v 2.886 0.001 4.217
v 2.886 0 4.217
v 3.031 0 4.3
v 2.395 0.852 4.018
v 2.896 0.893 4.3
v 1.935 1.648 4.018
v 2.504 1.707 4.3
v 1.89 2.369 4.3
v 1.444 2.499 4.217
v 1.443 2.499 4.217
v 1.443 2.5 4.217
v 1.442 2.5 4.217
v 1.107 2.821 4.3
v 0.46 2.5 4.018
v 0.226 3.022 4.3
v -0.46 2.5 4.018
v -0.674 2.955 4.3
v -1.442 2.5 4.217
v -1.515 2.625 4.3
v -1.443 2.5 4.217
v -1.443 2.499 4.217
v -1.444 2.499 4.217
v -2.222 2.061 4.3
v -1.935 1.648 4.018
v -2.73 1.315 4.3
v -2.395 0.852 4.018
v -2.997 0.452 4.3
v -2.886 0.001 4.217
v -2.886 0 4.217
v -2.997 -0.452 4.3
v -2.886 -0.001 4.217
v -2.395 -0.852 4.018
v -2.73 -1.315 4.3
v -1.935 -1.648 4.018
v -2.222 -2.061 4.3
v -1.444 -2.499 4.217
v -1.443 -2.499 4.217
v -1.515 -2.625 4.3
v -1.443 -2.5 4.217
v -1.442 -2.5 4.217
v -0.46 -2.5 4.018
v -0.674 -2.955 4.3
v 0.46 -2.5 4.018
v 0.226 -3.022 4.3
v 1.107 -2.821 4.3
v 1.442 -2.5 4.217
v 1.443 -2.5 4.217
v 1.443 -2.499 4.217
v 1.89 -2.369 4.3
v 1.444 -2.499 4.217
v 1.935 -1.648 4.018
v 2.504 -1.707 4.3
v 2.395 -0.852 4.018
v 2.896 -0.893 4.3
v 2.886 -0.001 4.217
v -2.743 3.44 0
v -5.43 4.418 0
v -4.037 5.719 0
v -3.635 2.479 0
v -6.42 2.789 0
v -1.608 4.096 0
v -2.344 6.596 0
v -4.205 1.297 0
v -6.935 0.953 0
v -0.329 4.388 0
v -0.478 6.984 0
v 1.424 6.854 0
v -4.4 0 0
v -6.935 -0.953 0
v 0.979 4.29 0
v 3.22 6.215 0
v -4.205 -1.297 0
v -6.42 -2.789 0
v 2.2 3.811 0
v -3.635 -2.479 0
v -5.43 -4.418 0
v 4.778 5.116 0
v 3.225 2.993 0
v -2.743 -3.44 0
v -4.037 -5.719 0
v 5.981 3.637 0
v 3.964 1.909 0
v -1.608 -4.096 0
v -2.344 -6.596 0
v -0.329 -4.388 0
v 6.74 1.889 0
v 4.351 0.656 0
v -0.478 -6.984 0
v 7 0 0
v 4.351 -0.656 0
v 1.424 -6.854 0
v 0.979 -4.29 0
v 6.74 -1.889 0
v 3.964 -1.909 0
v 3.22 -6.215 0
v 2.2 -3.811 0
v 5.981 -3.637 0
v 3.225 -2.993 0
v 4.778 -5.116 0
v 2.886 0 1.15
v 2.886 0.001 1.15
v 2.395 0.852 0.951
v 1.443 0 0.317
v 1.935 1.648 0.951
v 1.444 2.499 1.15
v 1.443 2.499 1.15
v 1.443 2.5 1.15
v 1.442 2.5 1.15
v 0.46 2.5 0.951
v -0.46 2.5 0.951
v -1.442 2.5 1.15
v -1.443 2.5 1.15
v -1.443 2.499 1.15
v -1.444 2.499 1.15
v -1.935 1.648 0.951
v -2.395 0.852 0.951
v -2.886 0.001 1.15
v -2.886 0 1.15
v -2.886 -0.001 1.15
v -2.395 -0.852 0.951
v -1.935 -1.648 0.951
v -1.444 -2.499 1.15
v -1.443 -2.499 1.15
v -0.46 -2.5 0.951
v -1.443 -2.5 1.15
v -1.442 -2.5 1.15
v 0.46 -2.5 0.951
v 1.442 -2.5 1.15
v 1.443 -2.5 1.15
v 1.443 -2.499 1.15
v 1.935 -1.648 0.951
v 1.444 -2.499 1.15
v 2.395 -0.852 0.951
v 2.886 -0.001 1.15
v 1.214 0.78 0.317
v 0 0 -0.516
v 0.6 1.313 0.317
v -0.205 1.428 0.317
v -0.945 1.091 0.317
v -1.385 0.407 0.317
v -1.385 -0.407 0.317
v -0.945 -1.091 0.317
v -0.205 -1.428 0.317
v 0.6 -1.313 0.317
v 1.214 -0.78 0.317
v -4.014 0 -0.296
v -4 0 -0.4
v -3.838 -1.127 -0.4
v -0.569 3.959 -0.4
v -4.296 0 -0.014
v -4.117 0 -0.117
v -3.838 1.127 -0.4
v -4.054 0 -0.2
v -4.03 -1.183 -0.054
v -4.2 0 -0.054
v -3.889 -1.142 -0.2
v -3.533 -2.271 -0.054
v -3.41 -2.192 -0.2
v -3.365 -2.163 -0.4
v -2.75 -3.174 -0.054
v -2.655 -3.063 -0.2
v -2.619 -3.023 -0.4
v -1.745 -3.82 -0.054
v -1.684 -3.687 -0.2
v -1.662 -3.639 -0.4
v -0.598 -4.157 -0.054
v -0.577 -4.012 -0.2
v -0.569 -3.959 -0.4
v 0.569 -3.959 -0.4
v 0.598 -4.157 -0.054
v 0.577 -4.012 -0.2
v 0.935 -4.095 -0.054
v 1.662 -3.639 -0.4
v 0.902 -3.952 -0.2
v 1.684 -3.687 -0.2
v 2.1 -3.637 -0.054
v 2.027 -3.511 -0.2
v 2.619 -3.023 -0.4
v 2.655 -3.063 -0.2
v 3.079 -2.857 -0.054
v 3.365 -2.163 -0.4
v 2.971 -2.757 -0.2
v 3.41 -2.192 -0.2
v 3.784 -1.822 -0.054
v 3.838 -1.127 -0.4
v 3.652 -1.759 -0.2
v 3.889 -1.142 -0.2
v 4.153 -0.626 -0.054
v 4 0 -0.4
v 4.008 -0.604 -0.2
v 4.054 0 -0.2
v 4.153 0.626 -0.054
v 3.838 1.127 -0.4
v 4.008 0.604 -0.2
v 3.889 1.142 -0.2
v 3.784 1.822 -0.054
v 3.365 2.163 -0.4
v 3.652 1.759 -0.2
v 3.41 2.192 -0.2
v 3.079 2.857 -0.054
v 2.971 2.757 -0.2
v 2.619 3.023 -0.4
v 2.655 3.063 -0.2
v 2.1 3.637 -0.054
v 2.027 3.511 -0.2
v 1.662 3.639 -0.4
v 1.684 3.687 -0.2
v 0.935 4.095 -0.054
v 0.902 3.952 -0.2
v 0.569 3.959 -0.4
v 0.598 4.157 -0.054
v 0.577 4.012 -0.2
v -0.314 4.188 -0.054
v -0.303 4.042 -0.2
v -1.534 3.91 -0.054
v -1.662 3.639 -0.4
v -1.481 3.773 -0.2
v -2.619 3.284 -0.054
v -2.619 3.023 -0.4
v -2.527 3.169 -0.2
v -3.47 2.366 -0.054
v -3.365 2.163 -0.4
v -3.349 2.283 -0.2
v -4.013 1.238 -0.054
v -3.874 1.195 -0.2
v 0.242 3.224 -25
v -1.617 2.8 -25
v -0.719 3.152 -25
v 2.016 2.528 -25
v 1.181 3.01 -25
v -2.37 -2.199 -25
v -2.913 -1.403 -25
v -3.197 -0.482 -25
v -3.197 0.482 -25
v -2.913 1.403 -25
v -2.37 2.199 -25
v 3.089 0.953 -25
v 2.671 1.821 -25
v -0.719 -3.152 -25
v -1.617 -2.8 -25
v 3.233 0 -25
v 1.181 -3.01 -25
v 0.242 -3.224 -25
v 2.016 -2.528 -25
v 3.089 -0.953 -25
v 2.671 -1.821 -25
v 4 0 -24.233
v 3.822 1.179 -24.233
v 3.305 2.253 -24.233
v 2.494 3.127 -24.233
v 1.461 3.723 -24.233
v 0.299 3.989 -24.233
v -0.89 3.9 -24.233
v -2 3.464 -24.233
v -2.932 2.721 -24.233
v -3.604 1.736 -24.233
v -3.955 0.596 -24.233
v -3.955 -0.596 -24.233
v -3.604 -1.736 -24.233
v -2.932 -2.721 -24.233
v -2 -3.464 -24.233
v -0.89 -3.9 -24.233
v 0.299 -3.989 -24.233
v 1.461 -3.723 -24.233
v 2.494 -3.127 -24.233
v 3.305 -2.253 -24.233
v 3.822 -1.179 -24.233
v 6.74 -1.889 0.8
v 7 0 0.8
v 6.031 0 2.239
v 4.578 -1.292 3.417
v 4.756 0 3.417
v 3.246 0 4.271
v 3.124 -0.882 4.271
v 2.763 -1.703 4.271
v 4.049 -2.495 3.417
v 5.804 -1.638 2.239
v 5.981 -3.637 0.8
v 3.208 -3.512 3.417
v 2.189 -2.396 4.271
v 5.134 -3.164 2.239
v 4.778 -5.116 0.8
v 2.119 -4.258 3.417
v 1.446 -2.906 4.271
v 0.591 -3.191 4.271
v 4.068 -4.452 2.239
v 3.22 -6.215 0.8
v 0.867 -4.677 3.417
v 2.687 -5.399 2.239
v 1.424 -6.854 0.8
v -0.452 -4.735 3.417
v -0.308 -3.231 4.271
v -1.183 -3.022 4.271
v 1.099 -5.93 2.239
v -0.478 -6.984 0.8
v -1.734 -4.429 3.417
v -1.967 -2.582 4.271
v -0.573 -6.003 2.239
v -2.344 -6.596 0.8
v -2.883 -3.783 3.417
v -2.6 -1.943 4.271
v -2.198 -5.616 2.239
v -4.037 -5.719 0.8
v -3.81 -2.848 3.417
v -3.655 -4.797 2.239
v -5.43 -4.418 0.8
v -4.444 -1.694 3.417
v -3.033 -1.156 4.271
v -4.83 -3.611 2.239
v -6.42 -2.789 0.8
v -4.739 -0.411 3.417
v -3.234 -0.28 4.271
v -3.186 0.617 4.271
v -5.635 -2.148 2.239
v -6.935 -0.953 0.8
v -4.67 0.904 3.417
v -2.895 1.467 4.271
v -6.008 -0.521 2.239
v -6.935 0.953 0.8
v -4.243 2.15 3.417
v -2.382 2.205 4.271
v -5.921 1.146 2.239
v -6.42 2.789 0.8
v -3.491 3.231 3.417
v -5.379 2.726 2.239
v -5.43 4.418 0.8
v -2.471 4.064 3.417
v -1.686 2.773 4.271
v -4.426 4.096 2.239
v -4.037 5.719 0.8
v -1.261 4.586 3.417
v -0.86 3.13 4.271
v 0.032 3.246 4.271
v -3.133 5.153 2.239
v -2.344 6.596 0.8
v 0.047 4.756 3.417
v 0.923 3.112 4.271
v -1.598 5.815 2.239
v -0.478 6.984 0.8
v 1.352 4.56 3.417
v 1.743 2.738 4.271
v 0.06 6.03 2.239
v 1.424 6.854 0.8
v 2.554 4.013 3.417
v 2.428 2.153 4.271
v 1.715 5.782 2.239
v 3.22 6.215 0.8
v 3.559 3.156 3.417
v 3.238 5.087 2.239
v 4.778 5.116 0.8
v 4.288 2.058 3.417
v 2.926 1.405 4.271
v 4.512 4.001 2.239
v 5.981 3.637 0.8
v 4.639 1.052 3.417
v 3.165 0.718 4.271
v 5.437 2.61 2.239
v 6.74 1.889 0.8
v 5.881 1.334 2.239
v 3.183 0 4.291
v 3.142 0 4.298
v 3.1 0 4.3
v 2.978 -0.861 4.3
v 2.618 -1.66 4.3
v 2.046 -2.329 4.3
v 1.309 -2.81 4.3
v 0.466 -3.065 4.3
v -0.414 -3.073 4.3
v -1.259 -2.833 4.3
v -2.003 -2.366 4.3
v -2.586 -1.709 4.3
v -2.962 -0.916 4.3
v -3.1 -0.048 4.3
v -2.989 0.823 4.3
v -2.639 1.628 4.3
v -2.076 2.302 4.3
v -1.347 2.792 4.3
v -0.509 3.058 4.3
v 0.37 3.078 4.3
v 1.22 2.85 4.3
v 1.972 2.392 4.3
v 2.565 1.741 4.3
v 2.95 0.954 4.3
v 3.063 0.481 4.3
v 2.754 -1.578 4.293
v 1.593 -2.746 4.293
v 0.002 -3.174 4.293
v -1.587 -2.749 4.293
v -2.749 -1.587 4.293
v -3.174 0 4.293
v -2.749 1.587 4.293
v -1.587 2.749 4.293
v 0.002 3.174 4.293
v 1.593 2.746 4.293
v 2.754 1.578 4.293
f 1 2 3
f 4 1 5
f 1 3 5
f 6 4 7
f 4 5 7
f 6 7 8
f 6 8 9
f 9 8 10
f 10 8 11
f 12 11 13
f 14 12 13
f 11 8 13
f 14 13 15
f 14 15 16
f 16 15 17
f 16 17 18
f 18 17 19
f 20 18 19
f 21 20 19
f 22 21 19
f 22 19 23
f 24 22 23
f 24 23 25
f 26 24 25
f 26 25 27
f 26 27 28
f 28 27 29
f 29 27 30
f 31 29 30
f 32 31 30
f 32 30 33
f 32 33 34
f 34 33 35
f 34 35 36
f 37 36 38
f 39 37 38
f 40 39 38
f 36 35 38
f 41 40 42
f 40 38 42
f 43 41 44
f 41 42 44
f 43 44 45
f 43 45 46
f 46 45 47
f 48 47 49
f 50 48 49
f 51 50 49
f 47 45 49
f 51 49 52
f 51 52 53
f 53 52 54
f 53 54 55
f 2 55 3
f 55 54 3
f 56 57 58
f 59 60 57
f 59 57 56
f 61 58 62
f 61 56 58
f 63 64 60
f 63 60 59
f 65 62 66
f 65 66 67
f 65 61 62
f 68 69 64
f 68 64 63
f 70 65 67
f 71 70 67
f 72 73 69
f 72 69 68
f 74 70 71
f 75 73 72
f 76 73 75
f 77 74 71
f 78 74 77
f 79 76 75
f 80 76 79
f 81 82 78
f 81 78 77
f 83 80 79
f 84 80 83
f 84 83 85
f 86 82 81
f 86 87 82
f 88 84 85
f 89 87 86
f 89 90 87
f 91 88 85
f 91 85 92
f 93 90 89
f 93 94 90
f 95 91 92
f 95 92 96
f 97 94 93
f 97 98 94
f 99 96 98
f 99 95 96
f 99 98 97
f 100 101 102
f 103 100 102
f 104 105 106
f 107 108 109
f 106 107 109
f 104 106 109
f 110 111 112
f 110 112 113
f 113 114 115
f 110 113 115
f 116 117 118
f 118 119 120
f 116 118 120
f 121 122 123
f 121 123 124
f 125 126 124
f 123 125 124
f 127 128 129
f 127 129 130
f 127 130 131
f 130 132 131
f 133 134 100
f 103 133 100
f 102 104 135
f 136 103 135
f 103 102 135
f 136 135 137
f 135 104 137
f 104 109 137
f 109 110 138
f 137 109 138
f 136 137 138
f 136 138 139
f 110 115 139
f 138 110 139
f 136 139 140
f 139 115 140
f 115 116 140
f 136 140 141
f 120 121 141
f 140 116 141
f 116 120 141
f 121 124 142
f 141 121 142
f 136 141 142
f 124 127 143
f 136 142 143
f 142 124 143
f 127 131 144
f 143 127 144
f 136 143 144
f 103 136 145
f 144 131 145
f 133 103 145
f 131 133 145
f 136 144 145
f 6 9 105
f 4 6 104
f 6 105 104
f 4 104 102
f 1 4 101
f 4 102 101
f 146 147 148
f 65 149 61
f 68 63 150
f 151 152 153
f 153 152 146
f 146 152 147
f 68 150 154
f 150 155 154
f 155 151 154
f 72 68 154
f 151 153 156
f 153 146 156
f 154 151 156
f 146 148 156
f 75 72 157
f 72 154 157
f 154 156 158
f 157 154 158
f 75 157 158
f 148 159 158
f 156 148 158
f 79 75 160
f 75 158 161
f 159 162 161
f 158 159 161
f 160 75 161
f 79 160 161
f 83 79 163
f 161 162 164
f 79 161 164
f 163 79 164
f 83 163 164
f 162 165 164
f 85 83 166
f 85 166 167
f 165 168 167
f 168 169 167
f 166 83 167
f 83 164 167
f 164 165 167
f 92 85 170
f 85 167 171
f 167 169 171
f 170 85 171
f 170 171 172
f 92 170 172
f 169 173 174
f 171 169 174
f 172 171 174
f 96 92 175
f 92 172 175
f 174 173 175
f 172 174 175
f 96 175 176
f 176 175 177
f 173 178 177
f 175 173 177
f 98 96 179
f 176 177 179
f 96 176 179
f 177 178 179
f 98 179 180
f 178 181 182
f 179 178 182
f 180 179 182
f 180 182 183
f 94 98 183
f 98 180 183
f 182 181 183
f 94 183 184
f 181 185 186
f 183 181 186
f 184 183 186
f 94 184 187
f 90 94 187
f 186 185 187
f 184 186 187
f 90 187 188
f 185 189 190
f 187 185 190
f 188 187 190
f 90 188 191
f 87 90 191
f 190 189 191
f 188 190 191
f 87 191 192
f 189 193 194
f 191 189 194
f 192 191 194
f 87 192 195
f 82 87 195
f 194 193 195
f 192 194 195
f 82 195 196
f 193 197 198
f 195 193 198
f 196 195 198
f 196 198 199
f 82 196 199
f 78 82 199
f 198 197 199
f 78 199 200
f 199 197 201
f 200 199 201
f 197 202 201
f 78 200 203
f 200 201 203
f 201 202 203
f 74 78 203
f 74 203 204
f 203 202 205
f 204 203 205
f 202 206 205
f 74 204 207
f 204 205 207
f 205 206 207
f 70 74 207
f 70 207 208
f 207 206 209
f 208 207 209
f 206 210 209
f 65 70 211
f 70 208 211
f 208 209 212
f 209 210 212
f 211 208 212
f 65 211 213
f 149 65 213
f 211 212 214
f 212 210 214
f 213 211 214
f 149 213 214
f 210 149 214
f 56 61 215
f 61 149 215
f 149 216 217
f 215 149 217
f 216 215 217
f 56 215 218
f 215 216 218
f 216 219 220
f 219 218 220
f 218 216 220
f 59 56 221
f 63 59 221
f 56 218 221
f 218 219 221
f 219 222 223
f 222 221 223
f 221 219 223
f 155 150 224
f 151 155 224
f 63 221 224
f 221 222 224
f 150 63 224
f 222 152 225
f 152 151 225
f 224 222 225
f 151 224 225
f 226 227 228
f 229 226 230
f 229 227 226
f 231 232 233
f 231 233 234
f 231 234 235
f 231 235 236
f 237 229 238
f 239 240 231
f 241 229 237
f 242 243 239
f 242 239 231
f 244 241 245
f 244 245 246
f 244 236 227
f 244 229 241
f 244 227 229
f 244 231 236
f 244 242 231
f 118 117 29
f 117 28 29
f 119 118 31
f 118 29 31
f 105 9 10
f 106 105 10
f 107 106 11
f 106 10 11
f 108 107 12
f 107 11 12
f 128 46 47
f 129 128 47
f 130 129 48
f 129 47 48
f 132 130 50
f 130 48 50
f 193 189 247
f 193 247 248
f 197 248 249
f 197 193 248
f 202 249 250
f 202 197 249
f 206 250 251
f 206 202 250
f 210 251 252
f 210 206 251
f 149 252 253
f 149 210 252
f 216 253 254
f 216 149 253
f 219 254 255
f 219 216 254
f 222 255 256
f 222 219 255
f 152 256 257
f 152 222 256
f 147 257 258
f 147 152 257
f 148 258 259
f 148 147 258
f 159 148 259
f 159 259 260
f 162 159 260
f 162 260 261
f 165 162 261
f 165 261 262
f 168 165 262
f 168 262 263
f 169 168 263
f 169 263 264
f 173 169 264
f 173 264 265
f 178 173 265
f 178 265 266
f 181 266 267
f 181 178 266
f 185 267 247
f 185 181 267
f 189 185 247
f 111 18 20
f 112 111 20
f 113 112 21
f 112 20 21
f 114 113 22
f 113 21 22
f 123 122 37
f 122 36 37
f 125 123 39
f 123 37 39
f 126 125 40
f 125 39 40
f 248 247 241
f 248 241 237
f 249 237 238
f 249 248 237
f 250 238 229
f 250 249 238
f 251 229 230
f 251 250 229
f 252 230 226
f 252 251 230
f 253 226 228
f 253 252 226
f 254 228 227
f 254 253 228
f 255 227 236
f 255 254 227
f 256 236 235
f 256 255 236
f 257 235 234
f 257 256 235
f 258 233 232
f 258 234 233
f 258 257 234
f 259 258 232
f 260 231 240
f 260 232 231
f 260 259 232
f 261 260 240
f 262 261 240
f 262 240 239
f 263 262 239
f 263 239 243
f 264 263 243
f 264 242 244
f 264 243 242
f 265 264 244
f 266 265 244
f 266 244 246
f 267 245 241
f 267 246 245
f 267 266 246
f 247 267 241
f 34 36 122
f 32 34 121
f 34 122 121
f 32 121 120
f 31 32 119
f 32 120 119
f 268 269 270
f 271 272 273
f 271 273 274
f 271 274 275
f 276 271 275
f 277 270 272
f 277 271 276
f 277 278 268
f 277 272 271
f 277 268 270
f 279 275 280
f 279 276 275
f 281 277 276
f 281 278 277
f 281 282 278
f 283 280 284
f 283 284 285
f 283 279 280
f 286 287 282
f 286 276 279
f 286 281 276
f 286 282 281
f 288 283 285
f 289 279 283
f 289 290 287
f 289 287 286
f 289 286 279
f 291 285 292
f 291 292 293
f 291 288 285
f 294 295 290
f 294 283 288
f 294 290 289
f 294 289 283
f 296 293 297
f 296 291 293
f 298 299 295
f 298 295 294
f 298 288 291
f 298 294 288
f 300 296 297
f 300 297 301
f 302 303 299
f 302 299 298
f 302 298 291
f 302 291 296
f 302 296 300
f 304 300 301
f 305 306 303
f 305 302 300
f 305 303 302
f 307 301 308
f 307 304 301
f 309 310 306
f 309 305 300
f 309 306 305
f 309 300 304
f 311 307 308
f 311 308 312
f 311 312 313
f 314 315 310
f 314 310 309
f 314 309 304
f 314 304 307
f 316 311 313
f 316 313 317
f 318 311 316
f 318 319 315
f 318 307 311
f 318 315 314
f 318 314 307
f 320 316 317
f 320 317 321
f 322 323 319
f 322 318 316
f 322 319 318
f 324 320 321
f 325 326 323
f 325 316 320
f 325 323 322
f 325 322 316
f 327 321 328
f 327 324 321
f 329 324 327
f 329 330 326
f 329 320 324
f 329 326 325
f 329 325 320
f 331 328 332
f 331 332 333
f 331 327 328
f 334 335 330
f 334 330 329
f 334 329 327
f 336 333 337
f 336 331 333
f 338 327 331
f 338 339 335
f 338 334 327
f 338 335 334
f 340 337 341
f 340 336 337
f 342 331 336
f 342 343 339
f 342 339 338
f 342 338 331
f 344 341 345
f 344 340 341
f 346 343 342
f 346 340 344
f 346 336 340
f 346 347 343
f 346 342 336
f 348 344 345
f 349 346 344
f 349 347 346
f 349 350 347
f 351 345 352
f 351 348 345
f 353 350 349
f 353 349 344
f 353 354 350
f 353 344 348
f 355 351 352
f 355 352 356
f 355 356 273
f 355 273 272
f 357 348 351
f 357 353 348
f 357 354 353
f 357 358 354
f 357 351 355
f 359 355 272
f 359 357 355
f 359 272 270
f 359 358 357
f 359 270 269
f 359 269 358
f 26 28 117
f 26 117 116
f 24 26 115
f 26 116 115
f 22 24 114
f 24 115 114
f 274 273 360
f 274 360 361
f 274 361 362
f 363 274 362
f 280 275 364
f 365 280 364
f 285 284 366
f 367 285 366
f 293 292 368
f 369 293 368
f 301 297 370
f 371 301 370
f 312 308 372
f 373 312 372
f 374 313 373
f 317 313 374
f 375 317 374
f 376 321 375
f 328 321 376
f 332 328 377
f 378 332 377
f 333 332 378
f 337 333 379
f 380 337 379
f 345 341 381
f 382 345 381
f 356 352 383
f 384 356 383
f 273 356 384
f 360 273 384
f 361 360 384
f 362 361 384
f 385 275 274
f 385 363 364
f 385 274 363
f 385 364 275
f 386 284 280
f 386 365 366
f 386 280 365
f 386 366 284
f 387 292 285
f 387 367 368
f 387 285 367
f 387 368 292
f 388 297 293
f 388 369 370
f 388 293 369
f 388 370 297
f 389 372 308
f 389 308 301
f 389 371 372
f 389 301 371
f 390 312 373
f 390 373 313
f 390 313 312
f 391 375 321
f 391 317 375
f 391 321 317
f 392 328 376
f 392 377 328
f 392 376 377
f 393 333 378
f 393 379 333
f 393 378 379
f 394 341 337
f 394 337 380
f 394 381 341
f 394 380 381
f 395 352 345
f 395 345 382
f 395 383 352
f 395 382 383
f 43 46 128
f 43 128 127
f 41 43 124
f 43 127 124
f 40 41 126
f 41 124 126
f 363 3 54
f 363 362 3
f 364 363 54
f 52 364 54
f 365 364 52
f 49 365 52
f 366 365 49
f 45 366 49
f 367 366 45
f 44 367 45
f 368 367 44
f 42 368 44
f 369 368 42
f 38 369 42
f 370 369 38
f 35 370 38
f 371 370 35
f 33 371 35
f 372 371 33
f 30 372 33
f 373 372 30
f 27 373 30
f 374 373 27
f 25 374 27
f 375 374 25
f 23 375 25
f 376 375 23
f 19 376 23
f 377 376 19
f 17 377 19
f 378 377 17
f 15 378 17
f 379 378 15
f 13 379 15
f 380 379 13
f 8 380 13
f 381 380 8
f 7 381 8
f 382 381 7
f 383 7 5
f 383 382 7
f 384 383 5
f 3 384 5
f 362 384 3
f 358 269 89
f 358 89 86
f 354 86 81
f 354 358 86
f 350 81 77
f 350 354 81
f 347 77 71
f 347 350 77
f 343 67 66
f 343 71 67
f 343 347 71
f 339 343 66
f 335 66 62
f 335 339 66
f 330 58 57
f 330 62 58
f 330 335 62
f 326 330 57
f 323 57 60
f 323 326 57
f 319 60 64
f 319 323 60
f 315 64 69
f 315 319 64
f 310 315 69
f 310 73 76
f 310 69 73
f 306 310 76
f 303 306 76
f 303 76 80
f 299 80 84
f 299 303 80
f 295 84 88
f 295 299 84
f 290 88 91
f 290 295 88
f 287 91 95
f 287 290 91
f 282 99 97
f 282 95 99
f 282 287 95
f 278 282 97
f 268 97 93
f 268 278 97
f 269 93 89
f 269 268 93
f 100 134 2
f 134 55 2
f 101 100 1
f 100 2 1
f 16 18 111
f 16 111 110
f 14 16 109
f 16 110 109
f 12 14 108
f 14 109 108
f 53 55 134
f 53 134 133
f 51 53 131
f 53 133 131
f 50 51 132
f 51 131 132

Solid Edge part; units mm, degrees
sketch "Sketch1" plane through (0, 0, 0) normal (0, -1, 0) x (1, 0, 0)
  line L0 (0, -25) -> (4, -25)
  line L1 (4, -25) -> (4, 0)
  line L2 (4, 0) -> (7, 0)
  line L3 (7, 0) -> (7, 0.8)
  arc A0 (3.1749, 4.3) -> (7, 0.8) centre (0.3366, -2.6422) cw
  line L4 (0, 4.3) -> (3.1749, 4.3)
  dimension "D1" = 25
  dimension "D2" = 4
  dimension "D3" = 3.1749
  dimension "D4" = 7
  dimension "D5" = 0.8
  dimension "D6" = 4.3
  dimension "D7" = 7.5
revolve "RevolvedProtrusion1" add sketch "Sketch1" angle 360 about axis through (0, 0, 5) along (0, 0, -1)
sketch "Sketch2" plane through (0, 0, 0) normal (0, -1, 0) x (1, 0, 0)
  line L0 (0, -0.5164) -> (2.8863, 1.15)
  line L1 (2.8863, 1.15) -> (2.8863, 4.3)
  line L2 (2.8863, 4.3) -> (0, 4.3)
  dimension "D1" = 2.8863
  dimension "D2" = 3.15
revolve "RevolvedCutout1" cut sketch "Sketch2" angle 360 about axis through (0, 0, 5.3) along (0, 0, -1)
sketch "Sketch3" plane through (0, 0, 0) normal (0, 0, -1) x (0, 1, 0)
  arc A0 (-2.5, 1.4425) -> (-2.5, -1.4425) centre (0, 0) ccw
  line L0 (-2.5, 1.4425) -> (-2.5, -1.4425)
  dimension "D1" = 2.5
extrude "Protrusion1" add sketch "Sketch3" against normal blind 4.3
pattern_circular "Pattern1" count 6 over 360 about axis through (0, 0, 0) along (0, 0, -1) of "Protrusion1"
fillet "Round_1" radius 0.375 1 edges at (-3.1749, 0, 4.3)
sketch "Sketch4" plane through (0, 0, 0) normal (0, -1, 0) x (1, 0, 0)
  line L0 (0, 2.5503) -> (3.0306, 4.3)
  line L1 (3.0306, 4.3) -> (0, 4.3)
  dimension "D1" = 3.0306
revolve "RevolvedCutout2" cut sketch "Sketch4" angle 360 about axis through (0, 0, 5.3) along (0, 0, -1)
sketch "Sketch5" plane through (0, 0, 0) normal (0, -1, 0) x (1, 0, 0)
  line L0 (-4, 0) -> (-4.4, 0)
  arc A0 (-4.4, 0) -> (-4, -0.4) centre (-4.4, -0.4) cw
  line L1 (-4, -0.4) -> (-4, 0)
  dimension "D1" = 1.02
  dimension "D2" = 4
  dimension "D3" = 0.4
revolve "RevolvedProtrusion2" add sketch "Sketch5" angle 360 about axis through (0, 0, -1.05) along (0, 0, 1)
cosmetic_thread "Thread1" size "M8"
chamfer "Chamfer1" distance 0.767 angle 45 1 edges at (-4, 0, -25)
properties material "Steel"
